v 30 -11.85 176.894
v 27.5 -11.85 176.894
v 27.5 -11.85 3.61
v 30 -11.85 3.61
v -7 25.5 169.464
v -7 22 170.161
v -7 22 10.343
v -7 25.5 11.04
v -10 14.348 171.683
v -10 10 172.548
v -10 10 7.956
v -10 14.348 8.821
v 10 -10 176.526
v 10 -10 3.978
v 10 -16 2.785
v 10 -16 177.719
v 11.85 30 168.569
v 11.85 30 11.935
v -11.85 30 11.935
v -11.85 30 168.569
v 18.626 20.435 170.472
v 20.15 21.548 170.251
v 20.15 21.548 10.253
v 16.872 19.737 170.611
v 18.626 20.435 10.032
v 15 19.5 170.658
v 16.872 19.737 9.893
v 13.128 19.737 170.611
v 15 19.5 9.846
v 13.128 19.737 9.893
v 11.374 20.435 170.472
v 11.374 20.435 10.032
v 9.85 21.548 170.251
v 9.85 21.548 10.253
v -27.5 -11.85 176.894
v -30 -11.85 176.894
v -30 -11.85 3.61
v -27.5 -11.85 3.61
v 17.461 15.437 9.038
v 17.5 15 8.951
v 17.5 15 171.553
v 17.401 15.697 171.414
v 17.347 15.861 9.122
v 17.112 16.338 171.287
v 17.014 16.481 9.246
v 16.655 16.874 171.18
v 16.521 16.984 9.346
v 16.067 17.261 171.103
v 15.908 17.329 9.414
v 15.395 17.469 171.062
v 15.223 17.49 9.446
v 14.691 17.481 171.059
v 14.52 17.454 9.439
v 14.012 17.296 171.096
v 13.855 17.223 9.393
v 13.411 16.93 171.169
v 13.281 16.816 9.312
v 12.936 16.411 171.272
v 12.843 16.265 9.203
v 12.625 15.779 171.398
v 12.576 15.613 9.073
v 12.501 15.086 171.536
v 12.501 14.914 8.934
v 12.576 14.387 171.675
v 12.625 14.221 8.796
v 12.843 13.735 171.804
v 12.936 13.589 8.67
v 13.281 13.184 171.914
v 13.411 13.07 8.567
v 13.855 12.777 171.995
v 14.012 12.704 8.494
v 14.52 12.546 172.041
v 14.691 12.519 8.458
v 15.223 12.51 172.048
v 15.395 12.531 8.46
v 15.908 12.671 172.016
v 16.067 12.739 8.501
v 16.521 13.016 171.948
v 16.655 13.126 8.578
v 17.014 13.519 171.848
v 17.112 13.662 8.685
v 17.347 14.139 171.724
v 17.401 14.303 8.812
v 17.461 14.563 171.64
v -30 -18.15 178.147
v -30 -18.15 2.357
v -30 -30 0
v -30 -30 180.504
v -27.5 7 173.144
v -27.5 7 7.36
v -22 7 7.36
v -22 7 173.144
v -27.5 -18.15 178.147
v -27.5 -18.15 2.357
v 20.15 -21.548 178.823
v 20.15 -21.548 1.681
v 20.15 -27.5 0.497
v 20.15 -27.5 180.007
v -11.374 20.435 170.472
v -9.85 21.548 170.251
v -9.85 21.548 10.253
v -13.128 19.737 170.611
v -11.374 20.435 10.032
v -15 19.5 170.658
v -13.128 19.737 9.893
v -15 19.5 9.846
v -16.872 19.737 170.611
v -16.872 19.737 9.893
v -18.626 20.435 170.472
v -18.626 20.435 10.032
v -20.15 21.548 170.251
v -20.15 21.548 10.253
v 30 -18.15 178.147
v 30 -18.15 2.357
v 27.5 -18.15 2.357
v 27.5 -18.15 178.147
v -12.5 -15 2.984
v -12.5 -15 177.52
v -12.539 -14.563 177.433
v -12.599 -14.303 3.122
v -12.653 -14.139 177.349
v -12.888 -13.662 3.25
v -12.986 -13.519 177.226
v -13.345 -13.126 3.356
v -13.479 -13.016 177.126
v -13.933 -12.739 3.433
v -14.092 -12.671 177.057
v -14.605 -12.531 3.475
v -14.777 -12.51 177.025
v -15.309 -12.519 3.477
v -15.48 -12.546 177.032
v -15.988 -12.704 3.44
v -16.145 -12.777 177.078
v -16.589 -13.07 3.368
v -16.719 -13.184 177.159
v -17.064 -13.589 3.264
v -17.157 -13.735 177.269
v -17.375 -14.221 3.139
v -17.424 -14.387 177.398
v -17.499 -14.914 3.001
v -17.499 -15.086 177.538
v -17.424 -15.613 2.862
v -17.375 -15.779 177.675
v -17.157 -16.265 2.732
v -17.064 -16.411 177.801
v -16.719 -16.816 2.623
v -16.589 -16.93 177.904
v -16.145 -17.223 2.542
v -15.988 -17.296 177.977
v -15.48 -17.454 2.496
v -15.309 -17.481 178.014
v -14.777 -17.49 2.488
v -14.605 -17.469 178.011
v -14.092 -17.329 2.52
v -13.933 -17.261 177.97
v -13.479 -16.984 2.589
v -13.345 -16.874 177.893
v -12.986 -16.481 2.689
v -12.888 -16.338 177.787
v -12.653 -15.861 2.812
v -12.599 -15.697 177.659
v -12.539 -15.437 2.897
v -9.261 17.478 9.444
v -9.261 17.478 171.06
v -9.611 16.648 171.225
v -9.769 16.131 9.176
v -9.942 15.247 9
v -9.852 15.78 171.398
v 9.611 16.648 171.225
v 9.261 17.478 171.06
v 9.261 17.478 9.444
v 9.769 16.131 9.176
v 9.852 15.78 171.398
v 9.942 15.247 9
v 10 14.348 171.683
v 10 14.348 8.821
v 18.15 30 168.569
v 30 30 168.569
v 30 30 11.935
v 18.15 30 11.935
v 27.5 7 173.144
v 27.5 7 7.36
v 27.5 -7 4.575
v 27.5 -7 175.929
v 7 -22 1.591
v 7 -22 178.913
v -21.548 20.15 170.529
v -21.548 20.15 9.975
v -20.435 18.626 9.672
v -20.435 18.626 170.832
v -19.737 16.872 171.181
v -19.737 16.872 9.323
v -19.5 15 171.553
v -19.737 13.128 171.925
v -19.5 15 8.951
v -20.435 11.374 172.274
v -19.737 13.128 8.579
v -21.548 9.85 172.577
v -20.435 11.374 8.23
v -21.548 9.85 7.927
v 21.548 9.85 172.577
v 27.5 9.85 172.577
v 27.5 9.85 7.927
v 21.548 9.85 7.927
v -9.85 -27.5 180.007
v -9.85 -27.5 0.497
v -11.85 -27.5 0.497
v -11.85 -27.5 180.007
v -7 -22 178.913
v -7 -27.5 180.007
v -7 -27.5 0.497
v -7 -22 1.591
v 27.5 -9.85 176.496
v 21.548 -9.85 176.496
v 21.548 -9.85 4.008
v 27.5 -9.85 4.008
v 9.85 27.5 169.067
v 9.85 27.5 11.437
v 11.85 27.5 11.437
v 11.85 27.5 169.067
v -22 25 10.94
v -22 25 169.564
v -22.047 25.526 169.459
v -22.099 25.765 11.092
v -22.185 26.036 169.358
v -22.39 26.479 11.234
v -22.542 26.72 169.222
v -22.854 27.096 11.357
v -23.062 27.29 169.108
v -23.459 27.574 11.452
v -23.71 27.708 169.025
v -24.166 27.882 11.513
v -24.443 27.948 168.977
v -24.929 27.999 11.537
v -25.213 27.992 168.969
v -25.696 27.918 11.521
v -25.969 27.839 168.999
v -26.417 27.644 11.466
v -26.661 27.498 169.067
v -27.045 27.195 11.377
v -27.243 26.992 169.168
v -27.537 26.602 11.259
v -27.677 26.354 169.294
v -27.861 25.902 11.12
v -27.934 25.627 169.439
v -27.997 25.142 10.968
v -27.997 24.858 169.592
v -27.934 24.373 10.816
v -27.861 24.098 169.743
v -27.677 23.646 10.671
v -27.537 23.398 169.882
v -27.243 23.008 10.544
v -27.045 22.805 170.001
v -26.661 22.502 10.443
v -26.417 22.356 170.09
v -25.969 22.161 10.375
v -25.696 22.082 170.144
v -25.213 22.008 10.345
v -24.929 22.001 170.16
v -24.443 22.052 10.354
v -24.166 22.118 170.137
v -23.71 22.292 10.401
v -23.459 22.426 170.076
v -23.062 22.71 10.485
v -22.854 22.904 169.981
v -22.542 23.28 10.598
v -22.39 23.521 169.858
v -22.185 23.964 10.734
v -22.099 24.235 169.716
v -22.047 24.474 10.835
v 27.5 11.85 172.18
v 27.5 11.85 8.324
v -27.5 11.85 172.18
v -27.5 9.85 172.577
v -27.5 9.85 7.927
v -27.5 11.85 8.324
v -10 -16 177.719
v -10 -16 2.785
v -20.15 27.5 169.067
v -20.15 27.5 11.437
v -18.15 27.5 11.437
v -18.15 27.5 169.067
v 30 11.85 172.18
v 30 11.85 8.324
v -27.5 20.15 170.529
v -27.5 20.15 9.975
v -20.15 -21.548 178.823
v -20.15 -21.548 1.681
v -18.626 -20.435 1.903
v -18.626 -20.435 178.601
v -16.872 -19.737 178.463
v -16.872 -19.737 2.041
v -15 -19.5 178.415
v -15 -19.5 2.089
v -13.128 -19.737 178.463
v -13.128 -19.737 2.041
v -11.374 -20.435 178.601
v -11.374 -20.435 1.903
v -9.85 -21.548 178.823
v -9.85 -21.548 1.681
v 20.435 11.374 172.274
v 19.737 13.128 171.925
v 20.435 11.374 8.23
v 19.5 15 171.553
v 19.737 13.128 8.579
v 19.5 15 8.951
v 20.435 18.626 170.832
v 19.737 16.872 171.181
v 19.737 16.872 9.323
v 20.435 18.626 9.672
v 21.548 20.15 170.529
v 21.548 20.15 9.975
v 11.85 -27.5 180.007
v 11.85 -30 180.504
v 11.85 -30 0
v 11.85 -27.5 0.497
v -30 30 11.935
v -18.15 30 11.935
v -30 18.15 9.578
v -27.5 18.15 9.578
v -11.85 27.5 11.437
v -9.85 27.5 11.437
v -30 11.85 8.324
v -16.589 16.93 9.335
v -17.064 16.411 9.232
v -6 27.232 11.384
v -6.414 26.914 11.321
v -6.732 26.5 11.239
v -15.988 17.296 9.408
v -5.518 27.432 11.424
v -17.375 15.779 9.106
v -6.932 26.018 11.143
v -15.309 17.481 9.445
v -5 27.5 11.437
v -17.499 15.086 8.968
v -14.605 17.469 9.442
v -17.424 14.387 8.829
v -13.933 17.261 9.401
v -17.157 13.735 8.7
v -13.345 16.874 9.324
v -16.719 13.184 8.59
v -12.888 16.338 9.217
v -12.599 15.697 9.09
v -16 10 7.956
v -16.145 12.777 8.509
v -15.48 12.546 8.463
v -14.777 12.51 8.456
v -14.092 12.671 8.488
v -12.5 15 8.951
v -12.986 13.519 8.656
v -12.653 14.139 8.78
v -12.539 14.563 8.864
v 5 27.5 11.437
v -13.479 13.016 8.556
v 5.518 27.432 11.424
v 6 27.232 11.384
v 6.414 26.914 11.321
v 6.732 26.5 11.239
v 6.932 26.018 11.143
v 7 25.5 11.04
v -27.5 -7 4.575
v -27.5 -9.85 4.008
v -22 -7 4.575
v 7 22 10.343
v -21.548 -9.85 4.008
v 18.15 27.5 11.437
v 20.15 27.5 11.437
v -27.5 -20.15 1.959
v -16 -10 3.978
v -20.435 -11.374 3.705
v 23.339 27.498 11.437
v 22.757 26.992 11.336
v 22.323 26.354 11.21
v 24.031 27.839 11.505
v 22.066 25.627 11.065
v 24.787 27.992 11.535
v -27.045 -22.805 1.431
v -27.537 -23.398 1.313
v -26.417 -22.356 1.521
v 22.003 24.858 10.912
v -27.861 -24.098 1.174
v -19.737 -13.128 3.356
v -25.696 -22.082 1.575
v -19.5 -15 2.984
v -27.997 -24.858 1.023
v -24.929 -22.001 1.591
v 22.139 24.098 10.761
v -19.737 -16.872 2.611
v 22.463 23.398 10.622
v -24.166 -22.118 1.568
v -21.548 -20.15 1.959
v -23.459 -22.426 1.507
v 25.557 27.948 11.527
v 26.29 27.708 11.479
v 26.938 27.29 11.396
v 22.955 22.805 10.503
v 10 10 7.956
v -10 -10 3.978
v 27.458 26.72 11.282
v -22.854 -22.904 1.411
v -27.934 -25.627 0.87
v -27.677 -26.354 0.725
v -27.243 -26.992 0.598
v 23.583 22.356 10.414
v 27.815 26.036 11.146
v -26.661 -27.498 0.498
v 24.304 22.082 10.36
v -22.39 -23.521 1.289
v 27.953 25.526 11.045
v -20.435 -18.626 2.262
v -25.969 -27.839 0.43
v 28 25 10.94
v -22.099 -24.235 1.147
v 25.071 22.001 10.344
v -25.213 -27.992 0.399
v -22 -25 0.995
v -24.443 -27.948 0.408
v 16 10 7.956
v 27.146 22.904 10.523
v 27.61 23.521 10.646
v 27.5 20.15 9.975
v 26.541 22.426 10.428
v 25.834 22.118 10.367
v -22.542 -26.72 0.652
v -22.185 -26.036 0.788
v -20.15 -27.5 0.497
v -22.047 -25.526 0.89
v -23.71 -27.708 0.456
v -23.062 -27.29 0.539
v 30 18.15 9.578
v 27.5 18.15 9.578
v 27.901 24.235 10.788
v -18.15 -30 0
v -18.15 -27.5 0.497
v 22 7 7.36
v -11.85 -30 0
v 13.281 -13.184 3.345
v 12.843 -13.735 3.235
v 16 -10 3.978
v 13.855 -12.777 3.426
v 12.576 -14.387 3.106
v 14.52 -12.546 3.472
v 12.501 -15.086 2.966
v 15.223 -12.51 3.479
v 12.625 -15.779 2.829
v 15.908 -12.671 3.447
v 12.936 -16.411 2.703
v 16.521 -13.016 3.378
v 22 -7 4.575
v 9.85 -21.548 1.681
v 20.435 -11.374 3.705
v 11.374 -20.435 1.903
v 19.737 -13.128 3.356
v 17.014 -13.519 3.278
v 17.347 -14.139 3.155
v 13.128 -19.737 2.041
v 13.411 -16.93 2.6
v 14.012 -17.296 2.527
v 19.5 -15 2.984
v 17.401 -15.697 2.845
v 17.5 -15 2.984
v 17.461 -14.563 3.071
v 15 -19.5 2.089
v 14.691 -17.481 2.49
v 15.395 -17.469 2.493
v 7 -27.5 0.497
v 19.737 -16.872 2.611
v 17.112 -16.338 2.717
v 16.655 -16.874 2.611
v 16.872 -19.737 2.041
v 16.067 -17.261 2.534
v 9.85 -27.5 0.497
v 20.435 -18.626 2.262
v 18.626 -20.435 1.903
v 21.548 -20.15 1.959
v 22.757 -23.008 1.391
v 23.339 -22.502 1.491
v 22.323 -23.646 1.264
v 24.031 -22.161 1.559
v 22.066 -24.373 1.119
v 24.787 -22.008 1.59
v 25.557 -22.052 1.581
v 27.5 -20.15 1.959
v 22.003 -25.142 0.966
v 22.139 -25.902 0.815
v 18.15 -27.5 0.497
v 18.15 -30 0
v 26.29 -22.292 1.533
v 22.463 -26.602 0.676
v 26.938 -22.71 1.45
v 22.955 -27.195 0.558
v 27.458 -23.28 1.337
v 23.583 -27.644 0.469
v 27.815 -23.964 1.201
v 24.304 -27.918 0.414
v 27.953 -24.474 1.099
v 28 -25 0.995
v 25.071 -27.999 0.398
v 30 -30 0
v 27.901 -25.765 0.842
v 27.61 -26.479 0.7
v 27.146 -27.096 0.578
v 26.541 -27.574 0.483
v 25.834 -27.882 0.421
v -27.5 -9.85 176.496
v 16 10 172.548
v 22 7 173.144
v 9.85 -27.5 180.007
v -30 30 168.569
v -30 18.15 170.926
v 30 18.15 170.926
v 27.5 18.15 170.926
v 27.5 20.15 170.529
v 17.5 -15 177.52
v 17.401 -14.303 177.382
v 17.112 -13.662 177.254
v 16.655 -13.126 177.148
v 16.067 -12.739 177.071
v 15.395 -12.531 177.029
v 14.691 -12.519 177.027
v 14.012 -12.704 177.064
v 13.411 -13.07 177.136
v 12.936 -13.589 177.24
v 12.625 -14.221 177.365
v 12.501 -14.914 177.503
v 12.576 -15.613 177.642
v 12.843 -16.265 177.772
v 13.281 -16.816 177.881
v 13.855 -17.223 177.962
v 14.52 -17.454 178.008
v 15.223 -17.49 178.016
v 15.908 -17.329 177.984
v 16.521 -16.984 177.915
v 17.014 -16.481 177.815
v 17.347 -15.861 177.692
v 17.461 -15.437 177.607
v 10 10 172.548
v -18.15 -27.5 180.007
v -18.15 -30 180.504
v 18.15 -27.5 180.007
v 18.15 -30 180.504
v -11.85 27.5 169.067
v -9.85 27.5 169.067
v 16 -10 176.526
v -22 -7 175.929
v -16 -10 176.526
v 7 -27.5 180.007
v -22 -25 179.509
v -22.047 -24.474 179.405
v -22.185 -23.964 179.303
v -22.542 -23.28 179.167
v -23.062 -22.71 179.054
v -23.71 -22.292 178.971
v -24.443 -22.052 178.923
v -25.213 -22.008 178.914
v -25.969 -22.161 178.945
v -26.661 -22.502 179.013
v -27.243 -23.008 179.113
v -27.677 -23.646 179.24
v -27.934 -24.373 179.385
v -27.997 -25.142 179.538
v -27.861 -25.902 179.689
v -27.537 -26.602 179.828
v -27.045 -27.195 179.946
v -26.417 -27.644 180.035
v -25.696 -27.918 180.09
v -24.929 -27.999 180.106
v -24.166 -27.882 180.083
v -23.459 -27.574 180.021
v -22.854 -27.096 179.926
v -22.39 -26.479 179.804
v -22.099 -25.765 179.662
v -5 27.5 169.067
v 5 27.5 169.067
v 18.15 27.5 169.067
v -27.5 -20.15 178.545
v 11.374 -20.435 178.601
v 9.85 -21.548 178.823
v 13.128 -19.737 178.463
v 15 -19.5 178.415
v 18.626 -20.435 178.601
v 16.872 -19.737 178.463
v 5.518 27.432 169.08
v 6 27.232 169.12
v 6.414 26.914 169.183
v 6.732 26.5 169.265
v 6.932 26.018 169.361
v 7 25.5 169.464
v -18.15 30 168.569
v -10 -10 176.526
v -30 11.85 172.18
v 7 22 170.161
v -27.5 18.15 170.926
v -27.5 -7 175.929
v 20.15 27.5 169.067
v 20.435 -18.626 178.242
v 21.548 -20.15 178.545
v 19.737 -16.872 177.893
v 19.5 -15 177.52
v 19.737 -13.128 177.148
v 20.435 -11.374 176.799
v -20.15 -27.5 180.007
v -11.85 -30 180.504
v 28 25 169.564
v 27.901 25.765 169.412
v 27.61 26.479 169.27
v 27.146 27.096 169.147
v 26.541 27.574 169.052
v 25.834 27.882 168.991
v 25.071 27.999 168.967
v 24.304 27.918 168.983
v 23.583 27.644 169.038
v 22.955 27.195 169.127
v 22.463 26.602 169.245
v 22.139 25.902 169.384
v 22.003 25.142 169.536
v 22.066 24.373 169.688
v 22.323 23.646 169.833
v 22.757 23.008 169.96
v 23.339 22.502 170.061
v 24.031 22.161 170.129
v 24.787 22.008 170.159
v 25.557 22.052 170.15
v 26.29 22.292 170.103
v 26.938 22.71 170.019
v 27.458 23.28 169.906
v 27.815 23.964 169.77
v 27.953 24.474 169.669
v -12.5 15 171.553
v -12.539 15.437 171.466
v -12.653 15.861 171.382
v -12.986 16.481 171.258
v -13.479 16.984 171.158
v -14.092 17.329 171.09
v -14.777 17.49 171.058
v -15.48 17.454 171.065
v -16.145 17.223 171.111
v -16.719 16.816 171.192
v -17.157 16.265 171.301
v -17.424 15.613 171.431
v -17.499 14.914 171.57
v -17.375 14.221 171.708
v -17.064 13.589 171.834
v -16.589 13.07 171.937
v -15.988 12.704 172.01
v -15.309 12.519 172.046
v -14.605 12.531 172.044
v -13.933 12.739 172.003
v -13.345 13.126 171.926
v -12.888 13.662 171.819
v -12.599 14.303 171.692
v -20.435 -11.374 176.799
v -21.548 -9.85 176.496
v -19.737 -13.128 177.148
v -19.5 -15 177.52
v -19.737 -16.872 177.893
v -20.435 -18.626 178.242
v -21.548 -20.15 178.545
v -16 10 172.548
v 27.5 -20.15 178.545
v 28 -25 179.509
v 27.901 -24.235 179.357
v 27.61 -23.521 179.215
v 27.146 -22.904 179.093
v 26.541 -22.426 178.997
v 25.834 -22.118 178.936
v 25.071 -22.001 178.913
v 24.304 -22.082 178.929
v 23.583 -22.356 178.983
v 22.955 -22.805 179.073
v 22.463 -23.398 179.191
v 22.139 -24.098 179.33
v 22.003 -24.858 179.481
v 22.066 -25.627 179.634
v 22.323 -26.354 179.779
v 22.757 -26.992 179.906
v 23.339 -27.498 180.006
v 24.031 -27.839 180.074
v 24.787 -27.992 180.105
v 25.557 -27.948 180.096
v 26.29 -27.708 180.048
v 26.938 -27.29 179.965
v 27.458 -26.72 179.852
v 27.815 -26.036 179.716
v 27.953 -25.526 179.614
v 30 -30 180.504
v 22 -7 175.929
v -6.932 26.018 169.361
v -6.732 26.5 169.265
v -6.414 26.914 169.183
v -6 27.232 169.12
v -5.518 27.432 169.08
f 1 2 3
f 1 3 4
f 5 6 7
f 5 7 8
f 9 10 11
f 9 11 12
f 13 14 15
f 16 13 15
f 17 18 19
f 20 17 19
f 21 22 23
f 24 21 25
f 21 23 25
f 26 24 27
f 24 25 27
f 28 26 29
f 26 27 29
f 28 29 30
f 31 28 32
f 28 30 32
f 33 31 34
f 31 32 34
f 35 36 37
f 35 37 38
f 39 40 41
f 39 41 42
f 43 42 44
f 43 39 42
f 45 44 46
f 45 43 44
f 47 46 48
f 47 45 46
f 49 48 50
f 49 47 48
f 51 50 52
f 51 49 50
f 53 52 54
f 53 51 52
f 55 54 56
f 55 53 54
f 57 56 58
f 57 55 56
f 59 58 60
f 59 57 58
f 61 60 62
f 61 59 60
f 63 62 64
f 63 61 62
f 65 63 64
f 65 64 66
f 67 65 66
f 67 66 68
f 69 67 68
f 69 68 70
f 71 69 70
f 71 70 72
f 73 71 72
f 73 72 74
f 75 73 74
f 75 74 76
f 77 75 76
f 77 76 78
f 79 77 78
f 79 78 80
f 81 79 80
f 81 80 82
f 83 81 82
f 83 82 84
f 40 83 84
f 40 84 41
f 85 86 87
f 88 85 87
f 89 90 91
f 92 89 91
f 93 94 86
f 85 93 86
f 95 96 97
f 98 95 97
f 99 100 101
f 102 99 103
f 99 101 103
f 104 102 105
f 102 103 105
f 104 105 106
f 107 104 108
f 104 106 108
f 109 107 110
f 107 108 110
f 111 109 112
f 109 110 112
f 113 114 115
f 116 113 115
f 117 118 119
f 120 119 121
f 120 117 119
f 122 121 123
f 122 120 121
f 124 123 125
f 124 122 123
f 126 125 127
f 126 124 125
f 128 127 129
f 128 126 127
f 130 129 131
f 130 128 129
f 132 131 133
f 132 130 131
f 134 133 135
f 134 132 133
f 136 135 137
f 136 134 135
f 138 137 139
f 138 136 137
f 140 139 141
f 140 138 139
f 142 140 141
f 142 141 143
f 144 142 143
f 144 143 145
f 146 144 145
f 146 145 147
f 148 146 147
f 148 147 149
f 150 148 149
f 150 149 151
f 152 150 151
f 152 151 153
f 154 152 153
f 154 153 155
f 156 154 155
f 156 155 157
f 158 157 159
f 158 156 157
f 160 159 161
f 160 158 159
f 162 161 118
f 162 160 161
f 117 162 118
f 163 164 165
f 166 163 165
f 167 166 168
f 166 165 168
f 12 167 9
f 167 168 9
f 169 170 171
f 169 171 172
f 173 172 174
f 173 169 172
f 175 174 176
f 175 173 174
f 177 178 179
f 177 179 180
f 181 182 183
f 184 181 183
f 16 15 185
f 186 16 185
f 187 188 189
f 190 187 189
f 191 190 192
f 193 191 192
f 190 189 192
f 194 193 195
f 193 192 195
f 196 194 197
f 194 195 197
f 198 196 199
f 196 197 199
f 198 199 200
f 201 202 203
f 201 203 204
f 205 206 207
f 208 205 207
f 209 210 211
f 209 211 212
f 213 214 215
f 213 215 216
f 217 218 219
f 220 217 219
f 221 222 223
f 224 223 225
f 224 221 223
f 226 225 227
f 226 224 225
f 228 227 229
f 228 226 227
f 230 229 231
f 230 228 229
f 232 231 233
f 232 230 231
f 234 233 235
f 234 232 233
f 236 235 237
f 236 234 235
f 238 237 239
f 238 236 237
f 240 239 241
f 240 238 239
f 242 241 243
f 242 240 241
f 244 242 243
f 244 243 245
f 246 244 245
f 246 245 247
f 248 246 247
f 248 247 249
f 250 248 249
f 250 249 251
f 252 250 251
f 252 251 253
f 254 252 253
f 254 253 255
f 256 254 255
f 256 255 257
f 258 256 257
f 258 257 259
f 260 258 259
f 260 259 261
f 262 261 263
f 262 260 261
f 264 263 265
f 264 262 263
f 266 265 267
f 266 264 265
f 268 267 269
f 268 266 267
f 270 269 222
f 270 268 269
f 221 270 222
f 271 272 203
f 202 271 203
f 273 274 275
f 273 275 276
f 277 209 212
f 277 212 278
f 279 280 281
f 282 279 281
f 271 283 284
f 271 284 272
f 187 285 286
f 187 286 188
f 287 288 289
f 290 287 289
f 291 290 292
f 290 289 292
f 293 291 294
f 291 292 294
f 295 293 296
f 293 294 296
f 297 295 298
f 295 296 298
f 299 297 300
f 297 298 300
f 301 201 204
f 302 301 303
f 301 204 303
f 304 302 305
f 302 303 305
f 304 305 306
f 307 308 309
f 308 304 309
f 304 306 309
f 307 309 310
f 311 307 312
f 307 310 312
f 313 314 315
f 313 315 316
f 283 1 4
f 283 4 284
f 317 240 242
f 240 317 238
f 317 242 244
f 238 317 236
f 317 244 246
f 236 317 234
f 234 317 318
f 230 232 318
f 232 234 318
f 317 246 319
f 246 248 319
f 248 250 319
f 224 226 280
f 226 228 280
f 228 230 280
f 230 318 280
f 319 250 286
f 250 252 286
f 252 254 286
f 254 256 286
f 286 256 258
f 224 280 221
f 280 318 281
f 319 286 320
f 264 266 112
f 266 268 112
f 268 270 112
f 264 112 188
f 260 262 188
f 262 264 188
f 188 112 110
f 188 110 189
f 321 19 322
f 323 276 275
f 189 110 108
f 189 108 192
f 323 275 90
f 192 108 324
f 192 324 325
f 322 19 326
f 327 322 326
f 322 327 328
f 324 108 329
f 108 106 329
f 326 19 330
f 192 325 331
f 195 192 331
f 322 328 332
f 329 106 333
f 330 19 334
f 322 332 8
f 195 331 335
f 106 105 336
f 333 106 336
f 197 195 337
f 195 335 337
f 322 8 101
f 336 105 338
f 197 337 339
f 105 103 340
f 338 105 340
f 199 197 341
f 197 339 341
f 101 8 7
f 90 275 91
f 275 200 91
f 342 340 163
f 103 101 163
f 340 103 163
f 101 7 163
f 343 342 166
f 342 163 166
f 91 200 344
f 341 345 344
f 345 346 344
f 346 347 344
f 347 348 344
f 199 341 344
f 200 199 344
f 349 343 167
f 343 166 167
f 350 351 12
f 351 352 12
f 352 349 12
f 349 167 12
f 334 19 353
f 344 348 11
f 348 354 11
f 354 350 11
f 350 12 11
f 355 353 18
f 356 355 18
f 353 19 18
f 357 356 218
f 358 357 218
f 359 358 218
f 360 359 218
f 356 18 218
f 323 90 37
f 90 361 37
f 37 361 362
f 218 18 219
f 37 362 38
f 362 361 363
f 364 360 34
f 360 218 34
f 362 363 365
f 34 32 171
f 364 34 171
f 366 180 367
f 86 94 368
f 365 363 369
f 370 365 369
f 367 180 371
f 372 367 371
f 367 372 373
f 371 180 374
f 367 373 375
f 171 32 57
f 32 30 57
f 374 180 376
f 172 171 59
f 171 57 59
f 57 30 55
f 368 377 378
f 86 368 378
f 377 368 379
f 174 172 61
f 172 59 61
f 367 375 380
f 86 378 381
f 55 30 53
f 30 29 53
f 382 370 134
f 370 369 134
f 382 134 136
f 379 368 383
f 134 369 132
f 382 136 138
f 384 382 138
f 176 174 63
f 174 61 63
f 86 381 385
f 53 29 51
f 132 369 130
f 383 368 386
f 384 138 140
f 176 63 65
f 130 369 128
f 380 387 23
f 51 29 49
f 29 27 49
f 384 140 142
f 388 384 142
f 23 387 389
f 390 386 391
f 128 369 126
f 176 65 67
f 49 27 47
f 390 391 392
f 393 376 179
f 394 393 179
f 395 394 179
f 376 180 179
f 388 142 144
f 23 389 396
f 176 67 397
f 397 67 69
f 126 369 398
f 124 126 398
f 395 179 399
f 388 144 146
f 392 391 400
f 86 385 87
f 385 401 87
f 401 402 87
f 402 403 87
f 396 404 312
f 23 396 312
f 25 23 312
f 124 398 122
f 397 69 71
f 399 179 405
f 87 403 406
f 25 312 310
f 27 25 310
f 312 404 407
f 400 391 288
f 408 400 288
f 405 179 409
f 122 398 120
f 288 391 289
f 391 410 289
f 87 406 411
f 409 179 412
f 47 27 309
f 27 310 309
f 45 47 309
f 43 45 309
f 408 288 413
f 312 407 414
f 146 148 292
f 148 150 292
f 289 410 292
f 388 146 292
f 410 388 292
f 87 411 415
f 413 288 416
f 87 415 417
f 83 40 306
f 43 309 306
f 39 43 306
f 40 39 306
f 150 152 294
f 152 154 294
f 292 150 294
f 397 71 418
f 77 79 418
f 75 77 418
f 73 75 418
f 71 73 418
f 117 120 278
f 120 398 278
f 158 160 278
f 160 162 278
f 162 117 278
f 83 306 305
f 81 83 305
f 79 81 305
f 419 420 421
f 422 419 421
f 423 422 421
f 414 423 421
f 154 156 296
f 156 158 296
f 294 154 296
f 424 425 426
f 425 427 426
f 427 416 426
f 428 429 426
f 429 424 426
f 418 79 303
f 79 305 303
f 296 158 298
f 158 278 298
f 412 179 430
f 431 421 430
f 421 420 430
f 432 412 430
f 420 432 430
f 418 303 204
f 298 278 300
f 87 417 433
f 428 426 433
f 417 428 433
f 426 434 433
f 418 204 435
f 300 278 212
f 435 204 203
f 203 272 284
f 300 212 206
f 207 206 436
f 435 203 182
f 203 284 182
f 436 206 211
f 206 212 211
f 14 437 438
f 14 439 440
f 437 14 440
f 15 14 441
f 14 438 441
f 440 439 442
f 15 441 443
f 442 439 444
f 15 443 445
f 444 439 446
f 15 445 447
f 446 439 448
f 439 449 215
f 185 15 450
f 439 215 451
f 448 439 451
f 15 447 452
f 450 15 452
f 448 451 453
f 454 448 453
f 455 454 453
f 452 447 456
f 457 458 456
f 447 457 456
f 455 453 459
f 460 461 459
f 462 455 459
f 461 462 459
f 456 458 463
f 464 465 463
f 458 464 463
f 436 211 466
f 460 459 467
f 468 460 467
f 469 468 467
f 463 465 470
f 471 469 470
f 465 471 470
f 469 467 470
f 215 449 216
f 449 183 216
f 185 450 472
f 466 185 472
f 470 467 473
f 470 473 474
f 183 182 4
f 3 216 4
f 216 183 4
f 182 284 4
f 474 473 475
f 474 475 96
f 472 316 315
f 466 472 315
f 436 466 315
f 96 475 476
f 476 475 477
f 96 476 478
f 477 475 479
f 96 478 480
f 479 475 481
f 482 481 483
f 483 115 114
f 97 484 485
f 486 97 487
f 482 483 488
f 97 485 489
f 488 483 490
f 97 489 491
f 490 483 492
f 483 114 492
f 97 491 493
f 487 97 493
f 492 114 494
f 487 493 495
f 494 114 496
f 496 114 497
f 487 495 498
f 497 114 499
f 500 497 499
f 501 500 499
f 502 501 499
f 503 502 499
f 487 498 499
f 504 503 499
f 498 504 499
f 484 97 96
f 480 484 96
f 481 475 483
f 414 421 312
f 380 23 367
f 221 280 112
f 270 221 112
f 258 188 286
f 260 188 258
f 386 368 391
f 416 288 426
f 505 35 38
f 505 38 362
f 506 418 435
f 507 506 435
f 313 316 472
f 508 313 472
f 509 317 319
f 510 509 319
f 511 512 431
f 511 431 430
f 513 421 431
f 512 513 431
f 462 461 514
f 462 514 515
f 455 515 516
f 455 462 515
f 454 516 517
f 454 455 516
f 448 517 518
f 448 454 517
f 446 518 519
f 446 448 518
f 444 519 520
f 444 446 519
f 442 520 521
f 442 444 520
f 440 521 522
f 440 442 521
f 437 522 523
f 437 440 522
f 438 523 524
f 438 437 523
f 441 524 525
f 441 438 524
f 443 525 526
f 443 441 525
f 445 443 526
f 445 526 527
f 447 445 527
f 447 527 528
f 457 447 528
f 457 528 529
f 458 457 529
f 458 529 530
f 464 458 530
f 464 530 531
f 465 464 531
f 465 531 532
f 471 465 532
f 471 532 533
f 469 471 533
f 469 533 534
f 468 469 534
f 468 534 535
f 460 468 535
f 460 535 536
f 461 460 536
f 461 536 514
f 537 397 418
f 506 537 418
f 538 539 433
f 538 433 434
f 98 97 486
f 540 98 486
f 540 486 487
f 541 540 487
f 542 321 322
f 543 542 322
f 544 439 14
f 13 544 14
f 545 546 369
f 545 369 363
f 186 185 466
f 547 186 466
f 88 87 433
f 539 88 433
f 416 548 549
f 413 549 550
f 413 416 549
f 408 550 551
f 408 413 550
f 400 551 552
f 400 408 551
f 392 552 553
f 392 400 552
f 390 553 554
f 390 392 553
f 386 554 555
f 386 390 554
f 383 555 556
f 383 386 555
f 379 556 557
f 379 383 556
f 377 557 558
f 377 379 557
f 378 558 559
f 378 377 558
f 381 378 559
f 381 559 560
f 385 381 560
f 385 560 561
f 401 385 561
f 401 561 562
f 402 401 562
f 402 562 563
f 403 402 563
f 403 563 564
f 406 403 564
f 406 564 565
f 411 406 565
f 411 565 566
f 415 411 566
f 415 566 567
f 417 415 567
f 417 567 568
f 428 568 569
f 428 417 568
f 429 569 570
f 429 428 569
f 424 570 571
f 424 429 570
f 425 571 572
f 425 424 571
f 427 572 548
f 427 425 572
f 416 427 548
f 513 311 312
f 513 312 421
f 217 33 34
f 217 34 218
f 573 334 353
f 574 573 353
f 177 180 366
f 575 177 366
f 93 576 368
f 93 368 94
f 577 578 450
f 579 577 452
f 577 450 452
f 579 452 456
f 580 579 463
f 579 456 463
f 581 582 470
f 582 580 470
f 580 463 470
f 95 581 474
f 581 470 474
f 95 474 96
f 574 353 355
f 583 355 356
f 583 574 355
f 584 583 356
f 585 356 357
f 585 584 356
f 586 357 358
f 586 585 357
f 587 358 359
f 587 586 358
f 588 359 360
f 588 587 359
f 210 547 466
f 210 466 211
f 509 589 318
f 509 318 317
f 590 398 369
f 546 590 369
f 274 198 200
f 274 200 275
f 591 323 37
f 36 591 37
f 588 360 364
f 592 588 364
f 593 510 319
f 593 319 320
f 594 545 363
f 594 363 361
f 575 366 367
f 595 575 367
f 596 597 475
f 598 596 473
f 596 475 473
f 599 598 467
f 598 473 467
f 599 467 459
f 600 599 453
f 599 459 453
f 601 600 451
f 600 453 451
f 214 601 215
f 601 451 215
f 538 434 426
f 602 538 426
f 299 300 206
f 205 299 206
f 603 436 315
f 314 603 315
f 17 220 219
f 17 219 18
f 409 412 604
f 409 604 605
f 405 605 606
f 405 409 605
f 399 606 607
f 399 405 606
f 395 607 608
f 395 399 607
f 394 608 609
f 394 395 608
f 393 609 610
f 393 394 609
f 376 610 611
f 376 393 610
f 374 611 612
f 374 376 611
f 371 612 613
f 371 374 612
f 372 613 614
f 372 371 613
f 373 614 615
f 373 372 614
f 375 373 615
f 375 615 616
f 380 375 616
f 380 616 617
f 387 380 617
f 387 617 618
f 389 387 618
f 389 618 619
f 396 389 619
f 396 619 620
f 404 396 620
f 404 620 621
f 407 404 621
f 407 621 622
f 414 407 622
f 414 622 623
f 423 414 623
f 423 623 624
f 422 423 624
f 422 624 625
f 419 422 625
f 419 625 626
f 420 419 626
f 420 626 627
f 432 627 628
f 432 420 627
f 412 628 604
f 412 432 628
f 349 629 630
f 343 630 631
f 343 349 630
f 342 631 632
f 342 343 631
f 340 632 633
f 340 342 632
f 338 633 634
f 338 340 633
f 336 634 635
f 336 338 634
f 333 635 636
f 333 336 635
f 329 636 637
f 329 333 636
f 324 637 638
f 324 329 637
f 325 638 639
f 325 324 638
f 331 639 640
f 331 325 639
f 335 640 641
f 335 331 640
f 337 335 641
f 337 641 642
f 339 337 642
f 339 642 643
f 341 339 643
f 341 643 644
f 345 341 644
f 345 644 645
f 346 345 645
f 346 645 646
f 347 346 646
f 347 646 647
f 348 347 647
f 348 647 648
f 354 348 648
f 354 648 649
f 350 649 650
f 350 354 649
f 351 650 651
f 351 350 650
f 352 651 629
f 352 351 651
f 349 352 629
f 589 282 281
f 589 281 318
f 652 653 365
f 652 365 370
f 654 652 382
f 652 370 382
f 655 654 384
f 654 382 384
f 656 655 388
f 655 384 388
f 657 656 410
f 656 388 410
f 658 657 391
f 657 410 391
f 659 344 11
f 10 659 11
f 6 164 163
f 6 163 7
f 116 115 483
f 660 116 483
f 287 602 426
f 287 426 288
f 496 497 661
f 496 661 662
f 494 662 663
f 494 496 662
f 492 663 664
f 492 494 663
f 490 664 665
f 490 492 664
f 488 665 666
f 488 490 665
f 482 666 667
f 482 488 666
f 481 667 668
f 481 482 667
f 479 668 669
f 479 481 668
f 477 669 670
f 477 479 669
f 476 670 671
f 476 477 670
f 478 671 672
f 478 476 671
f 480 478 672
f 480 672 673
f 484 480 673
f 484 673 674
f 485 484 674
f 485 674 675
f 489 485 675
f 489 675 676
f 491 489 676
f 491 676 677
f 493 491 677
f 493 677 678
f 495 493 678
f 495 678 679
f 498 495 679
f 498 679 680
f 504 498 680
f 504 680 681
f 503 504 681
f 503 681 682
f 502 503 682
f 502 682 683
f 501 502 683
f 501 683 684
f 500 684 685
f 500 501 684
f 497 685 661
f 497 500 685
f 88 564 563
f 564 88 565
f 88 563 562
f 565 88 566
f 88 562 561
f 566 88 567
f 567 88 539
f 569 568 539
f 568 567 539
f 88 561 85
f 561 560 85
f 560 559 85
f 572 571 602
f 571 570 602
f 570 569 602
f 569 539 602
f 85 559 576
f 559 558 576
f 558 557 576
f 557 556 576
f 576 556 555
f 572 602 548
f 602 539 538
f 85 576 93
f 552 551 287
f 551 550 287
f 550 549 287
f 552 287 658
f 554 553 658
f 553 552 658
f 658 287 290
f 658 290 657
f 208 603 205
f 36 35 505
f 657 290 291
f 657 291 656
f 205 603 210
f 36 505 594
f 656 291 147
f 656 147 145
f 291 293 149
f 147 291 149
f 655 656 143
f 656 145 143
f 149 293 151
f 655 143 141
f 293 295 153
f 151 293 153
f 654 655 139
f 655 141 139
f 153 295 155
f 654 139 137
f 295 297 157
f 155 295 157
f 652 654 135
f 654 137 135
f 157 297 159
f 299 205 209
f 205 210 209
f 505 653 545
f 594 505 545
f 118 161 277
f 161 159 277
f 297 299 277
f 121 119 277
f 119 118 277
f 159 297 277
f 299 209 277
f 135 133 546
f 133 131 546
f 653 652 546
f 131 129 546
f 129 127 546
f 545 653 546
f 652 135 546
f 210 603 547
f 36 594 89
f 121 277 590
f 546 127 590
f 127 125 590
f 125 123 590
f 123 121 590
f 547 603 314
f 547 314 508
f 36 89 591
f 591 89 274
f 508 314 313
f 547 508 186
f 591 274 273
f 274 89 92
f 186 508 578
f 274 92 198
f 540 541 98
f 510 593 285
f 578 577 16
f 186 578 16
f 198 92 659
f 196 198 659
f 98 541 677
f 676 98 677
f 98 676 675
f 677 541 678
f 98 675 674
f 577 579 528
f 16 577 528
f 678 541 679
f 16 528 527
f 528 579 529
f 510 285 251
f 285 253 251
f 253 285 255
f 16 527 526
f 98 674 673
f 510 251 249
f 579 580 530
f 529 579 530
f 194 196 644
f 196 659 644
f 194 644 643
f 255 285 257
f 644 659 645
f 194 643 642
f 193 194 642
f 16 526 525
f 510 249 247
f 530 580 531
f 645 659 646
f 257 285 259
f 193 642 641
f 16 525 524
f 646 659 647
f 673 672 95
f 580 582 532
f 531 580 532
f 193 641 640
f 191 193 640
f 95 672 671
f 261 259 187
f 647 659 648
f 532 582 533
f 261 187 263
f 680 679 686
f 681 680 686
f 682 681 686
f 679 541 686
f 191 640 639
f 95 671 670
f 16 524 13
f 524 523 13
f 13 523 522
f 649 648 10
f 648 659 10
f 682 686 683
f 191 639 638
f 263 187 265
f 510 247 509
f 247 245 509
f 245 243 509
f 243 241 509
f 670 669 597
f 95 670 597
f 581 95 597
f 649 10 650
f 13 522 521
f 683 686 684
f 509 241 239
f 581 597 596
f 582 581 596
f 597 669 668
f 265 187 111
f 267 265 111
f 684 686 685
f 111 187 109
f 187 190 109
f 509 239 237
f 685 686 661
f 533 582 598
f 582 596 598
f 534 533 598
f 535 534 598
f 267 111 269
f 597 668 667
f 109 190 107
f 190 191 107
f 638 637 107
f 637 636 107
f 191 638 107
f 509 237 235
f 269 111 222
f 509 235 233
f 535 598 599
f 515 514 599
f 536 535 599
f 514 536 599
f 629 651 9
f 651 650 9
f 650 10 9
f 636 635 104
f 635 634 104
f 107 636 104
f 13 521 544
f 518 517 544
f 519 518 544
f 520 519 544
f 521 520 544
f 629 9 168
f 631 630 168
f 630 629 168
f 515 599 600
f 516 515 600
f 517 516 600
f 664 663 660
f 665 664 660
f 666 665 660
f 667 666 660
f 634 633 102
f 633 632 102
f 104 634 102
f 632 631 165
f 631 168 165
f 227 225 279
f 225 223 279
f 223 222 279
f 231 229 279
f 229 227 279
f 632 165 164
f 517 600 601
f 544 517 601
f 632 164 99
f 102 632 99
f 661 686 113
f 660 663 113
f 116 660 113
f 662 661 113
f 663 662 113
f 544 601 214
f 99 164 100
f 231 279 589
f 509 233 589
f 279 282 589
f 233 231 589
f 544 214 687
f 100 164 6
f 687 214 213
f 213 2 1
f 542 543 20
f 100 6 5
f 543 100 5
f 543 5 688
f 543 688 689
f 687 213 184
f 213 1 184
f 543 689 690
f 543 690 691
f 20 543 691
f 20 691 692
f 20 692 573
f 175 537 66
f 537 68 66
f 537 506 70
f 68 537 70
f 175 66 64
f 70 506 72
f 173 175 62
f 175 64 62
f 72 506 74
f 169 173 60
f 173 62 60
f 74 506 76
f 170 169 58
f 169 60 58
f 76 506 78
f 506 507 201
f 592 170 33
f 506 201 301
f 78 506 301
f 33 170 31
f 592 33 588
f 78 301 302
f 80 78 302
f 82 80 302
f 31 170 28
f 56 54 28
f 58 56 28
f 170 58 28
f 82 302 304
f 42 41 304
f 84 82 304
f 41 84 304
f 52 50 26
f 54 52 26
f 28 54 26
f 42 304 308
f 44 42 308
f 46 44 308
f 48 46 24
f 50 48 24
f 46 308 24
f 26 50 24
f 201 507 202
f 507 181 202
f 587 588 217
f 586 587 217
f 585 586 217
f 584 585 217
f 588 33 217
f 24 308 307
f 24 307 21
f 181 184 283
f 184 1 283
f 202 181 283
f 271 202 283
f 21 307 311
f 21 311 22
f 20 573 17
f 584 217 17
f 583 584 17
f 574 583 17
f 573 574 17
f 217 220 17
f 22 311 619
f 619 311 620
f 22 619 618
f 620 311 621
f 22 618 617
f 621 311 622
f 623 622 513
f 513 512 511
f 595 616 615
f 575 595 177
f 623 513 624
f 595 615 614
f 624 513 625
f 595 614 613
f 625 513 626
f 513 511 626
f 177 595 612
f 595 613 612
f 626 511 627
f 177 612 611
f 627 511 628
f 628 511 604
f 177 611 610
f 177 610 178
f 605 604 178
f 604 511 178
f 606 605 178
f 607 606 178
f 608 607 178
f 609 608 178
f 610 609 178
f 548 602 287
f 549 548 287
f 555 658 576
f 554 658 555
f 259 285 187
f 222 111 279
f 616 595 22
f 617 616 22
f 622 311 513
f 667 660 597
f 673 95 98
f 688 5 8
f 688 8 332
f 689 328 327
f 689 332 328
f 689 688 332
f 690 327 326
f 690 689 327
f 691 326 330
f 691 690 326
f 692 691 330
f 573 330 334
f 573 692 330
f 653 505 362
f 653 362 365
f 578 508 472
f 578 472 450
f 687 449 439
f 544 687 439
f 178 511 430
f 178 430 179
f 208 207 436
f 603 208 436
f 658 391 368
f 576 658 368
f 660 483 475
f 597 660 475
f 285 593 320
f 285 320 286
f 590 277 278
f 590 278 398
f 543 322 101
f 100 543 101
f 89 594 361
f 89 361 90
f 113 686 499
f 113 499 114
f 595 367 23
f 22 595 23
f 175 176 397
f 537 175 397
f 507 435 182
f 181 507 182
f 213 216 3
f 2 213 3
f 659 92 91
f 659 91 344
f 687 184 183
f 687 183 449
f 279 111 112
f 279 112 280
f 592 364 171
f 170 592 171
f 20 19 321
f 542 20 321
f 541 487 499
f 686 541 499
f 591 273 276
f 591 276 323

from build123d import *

# Parameters (mm, degrees)
F0_R          = 3
F0_R_2        = 2.5
F1_DEPTH      = 180.504
F2_R          = 2
F3_R          = 7
F6_DEPTH      = 30
F6_DEPTH_BACK = 30


# Not quite as in the source:
# - a feature names something its author has since deleted; it is built from what else it names


with BuildPart() as f1:
    # F0 (on Top) → F1 (new body)
    with BuildSketch(Plane.XY):
        with BuildLine():
            Line((18.15, -30), (30, -30))
            Line((30, -30), (30, -18.15))
            Line((30, -18.15), (27.5, -18.15))
            Line((27.5, -18.15), (27.5, -20.15))
            Line((27.5, -20.15), (21.5477069044, -20.15))
            ThreePointArc((21.5477069044, -20.15), (19.5, -15), (21.5477069044, -9.85))
            Line((21.5477069044, -9.85), (27.5, -9.85))
            Line((27.5, -9.85), (27.5, -11.85))
            Line((27.5, -11.85), (30, -11.85))
            Line((30, -11.85), (30, 11.85))
            Line((30, 11.85), (27.5, 11.85))
            Line((27.5, 11.85), (27.5, 9.85))
            Line((27.5, 9.85), (21.5477069044, 9.85))
            ThreePointArc((21.5477069044, 9.85), (19.5, 15), (21.5477069044, 20.15))
            Line((21.5477069044, 20.15), (27.5, 20.15))
            Line((27.5, 20.15), (27.5, 18.15))
            Line((27.5, 18.15), (30, 18.15))
            Line((30, 18.15), (30, 30))
            Line((30, 30), (18.15, 30))
            Line((18.15, 30), (18.15, 27.5))
            Line((18.15, 27.5), (20.15, 27.5))
            Line((20.15, 27.5), (20.15, 21.5477069044))
            ThreePointArc((20.15, 21.5477069044), (15, 19.5), (9.85, 21.5477069044))
            Line((9.85, 21.5477069044), (9.85, 27.5))
            Line((9.85, 27.5), (11.85, 27.5))
            Line((11.85, 27.5), (11.85, 30))
            Line((11.85, 30), (-11.85, 30))
            Line((-11.85, 30), (-11.85, 27.5))
            Line((-11.85, 27.5), (-9.85, 27.5))
            Line((-9.85, 27.5), (-9.85, 21.5477069044))
            ThreePointArc((-9.85, 21.5477069044), (-15, 19.5), (-20.15, 21.5477069044))
            Line((-20.15, 21.5477069044), (-20.15, 27.5))
            Line((-20.15, 27.5), (-18.15, 27.5))
            Line((-18.15, 27.5), (-18.15, 30))
            Line((-18.15, 30), (-30, 30))
            Line((-30, 30), (-30, 18.15))
            Line((-30, 18.15), (-27.5, 18.15))
            Line((-27.5, 18.15), (-27.5, 20.15))
            Line((-27.5, 20.15), (-21.5477069044, 20.15))
            ThreePointArc((-21.5477069044, 20.15), (-19.5, 15), (-21.5477069044, 9.85))
            Line((-21.5477069044, 9.85), (-27.5, 9.85))
            Line((-27.5, 9.85), (-27.5, 11.85))
            Line((-27.5, 11.85), (-30, 11.85))
            Line((-30, 11.85), (-30, -11.85))
            Line((-30, -11.85), (-27.5, -11.85))
            Line((-27.5, -11.85), (-27.5, -9.85))
            Line((-27.5, -9.85), (-21.5477069044, -9.85))
            ThreePointArc((-21.5477069044, -9.85), (-19.5, -15), (-21.5477069044, -20.15))
            Line((-21.5477069044, -20.15), (-27.5, -20.15))
            Line((-27.5, -20.15), (-27.5, -18.15))
            Line((-27.5, -18.15), (-30, -18.15))
            Line((-30, -18.15), (-30, -30))
            Line((-30, -30), (-18.15, -30))
            Line((-18.15, -30), (-18.15, -27.5))
            Line((-18.15, -27.5), (-20.15, -27.5))
            Line((-20.15, -27.5), (-20.15, -21.5477069044))
            ThreePointArc((-20.15, -21.5477069044), (-15, -19.5), (-9.85, -21.5477069044))
            Line((-9.85, -21.5477069044), (-9.85, -27.5))
            Line((-9.85, -27.5), (-11.85, -27.5))
            Line((-11.85, -27.5), (-11.85, -30))
            Line((-11.85, -30), (11.85, -30))
            Line((11.85, -30), (11.85, -27.5))
            Line((11.85, -27.5), (9.85, -27.5))
            Line((9.85, -27.5), (9.85, -21.5477069044))
            ThreePointArc((9.85, -21.5477069044), (15, -19.5), (20.15, -21.5477069044))
            Line((20.15, -21.5477069044), (20.15, -27.5))
            Line((20.15, -27.5), (18.15, -27.5))
            Line((18.15, -27.5), (18.15, -30))
        make_face()
        with Locations((-25, -25)):
            Circle(F0_R, mode=Mode.SUBTRACT)
        with Locations((-15, -15)):
            Circle(F0_R_2, mode=Mode.SUBTRACT)
        with Locations((25, -25)):
            Circle(F0_R, mode=Mode.SUBTRACT)
        with Locations((15, -15)):
            Circle(F0_R_2, mode=Mode.SUBTRACT)
        with Locations((-25, 25)):
            Circle(F0_R, mode=Mode.SUBTRACT)
        with Locations((-15, 15)):
            Circle(F0_R_2, mode=Mode.SUBTRACT)
        Polygon((-7, 22), (-7, 27.5), (0, 27.5), (7, 27.5), (7, 22), (10, 16), (10, 10), (16, 10), (22, 7), (27.5, 7), (27.5, 0), (27.5, -7), (22, -7), (16, -10), (10, -10), (10, -16), (7, -22), (7, -27.5), (0, -27.5), (-7, -27.5), (-7, -22), (-10, -16), (-10, -10), (-16, -10), (-22, -7), (-27.5, -7), (-27.5, 0), (-27.5, 7), (-22, 7), (-16, 10), (-10, 10), (-10, 16), align=None, mode=Mode.SUBTRACT)
        with Locations((15, 15)):
            Circle(F0_R_2, mode=Mode.SUBTRACT)
        with Locations((25, 25)):
            Circle(F0_R, mode=Mode.SUBTRACT)
    extrude(amount=F1_DEPTH)

    # F2
    f2_edges = [f1.edges().sort_by_distance(p)[0] for p in [
        (-7, 27.5, 90.252),
        (7, 27.5, 90.252),
    ]]
    fillet(f2_edges, radius=F2_R)

    # F3
    f3_edges = [f1.edges().sort_by_distance(p)[0] for p in [
        (-10, 16, 90.252),
        (10, 16, 90.252),
    ]]
    fillet(f3_edges, radius=F3_R)

    # F5 (on Right) → F6 (cut, two sides)
    with BuildSketch(Plane.YZ) as f6_sk:
        Polygon((166.5976946582, -66.7170951811), (146.3493769552, 35.0780720561), (-30, 0), (-9.751682297, -101.7951672372), align=None)
        Polygon((135.5963626007, 147.5648354856), (151.7094622056, 228.5708574701), (-13.8869003951, 261.5100219845), (-30, 180.504), align=None)
    extrude(amount=F6_DEPTH, mode=Mode.SUBTRACT)
    extrude(f6_sk.sketch, amount=-F6_DEPTH_BACK, mode=Mode.SUBTRACT)


solid = f1.part
